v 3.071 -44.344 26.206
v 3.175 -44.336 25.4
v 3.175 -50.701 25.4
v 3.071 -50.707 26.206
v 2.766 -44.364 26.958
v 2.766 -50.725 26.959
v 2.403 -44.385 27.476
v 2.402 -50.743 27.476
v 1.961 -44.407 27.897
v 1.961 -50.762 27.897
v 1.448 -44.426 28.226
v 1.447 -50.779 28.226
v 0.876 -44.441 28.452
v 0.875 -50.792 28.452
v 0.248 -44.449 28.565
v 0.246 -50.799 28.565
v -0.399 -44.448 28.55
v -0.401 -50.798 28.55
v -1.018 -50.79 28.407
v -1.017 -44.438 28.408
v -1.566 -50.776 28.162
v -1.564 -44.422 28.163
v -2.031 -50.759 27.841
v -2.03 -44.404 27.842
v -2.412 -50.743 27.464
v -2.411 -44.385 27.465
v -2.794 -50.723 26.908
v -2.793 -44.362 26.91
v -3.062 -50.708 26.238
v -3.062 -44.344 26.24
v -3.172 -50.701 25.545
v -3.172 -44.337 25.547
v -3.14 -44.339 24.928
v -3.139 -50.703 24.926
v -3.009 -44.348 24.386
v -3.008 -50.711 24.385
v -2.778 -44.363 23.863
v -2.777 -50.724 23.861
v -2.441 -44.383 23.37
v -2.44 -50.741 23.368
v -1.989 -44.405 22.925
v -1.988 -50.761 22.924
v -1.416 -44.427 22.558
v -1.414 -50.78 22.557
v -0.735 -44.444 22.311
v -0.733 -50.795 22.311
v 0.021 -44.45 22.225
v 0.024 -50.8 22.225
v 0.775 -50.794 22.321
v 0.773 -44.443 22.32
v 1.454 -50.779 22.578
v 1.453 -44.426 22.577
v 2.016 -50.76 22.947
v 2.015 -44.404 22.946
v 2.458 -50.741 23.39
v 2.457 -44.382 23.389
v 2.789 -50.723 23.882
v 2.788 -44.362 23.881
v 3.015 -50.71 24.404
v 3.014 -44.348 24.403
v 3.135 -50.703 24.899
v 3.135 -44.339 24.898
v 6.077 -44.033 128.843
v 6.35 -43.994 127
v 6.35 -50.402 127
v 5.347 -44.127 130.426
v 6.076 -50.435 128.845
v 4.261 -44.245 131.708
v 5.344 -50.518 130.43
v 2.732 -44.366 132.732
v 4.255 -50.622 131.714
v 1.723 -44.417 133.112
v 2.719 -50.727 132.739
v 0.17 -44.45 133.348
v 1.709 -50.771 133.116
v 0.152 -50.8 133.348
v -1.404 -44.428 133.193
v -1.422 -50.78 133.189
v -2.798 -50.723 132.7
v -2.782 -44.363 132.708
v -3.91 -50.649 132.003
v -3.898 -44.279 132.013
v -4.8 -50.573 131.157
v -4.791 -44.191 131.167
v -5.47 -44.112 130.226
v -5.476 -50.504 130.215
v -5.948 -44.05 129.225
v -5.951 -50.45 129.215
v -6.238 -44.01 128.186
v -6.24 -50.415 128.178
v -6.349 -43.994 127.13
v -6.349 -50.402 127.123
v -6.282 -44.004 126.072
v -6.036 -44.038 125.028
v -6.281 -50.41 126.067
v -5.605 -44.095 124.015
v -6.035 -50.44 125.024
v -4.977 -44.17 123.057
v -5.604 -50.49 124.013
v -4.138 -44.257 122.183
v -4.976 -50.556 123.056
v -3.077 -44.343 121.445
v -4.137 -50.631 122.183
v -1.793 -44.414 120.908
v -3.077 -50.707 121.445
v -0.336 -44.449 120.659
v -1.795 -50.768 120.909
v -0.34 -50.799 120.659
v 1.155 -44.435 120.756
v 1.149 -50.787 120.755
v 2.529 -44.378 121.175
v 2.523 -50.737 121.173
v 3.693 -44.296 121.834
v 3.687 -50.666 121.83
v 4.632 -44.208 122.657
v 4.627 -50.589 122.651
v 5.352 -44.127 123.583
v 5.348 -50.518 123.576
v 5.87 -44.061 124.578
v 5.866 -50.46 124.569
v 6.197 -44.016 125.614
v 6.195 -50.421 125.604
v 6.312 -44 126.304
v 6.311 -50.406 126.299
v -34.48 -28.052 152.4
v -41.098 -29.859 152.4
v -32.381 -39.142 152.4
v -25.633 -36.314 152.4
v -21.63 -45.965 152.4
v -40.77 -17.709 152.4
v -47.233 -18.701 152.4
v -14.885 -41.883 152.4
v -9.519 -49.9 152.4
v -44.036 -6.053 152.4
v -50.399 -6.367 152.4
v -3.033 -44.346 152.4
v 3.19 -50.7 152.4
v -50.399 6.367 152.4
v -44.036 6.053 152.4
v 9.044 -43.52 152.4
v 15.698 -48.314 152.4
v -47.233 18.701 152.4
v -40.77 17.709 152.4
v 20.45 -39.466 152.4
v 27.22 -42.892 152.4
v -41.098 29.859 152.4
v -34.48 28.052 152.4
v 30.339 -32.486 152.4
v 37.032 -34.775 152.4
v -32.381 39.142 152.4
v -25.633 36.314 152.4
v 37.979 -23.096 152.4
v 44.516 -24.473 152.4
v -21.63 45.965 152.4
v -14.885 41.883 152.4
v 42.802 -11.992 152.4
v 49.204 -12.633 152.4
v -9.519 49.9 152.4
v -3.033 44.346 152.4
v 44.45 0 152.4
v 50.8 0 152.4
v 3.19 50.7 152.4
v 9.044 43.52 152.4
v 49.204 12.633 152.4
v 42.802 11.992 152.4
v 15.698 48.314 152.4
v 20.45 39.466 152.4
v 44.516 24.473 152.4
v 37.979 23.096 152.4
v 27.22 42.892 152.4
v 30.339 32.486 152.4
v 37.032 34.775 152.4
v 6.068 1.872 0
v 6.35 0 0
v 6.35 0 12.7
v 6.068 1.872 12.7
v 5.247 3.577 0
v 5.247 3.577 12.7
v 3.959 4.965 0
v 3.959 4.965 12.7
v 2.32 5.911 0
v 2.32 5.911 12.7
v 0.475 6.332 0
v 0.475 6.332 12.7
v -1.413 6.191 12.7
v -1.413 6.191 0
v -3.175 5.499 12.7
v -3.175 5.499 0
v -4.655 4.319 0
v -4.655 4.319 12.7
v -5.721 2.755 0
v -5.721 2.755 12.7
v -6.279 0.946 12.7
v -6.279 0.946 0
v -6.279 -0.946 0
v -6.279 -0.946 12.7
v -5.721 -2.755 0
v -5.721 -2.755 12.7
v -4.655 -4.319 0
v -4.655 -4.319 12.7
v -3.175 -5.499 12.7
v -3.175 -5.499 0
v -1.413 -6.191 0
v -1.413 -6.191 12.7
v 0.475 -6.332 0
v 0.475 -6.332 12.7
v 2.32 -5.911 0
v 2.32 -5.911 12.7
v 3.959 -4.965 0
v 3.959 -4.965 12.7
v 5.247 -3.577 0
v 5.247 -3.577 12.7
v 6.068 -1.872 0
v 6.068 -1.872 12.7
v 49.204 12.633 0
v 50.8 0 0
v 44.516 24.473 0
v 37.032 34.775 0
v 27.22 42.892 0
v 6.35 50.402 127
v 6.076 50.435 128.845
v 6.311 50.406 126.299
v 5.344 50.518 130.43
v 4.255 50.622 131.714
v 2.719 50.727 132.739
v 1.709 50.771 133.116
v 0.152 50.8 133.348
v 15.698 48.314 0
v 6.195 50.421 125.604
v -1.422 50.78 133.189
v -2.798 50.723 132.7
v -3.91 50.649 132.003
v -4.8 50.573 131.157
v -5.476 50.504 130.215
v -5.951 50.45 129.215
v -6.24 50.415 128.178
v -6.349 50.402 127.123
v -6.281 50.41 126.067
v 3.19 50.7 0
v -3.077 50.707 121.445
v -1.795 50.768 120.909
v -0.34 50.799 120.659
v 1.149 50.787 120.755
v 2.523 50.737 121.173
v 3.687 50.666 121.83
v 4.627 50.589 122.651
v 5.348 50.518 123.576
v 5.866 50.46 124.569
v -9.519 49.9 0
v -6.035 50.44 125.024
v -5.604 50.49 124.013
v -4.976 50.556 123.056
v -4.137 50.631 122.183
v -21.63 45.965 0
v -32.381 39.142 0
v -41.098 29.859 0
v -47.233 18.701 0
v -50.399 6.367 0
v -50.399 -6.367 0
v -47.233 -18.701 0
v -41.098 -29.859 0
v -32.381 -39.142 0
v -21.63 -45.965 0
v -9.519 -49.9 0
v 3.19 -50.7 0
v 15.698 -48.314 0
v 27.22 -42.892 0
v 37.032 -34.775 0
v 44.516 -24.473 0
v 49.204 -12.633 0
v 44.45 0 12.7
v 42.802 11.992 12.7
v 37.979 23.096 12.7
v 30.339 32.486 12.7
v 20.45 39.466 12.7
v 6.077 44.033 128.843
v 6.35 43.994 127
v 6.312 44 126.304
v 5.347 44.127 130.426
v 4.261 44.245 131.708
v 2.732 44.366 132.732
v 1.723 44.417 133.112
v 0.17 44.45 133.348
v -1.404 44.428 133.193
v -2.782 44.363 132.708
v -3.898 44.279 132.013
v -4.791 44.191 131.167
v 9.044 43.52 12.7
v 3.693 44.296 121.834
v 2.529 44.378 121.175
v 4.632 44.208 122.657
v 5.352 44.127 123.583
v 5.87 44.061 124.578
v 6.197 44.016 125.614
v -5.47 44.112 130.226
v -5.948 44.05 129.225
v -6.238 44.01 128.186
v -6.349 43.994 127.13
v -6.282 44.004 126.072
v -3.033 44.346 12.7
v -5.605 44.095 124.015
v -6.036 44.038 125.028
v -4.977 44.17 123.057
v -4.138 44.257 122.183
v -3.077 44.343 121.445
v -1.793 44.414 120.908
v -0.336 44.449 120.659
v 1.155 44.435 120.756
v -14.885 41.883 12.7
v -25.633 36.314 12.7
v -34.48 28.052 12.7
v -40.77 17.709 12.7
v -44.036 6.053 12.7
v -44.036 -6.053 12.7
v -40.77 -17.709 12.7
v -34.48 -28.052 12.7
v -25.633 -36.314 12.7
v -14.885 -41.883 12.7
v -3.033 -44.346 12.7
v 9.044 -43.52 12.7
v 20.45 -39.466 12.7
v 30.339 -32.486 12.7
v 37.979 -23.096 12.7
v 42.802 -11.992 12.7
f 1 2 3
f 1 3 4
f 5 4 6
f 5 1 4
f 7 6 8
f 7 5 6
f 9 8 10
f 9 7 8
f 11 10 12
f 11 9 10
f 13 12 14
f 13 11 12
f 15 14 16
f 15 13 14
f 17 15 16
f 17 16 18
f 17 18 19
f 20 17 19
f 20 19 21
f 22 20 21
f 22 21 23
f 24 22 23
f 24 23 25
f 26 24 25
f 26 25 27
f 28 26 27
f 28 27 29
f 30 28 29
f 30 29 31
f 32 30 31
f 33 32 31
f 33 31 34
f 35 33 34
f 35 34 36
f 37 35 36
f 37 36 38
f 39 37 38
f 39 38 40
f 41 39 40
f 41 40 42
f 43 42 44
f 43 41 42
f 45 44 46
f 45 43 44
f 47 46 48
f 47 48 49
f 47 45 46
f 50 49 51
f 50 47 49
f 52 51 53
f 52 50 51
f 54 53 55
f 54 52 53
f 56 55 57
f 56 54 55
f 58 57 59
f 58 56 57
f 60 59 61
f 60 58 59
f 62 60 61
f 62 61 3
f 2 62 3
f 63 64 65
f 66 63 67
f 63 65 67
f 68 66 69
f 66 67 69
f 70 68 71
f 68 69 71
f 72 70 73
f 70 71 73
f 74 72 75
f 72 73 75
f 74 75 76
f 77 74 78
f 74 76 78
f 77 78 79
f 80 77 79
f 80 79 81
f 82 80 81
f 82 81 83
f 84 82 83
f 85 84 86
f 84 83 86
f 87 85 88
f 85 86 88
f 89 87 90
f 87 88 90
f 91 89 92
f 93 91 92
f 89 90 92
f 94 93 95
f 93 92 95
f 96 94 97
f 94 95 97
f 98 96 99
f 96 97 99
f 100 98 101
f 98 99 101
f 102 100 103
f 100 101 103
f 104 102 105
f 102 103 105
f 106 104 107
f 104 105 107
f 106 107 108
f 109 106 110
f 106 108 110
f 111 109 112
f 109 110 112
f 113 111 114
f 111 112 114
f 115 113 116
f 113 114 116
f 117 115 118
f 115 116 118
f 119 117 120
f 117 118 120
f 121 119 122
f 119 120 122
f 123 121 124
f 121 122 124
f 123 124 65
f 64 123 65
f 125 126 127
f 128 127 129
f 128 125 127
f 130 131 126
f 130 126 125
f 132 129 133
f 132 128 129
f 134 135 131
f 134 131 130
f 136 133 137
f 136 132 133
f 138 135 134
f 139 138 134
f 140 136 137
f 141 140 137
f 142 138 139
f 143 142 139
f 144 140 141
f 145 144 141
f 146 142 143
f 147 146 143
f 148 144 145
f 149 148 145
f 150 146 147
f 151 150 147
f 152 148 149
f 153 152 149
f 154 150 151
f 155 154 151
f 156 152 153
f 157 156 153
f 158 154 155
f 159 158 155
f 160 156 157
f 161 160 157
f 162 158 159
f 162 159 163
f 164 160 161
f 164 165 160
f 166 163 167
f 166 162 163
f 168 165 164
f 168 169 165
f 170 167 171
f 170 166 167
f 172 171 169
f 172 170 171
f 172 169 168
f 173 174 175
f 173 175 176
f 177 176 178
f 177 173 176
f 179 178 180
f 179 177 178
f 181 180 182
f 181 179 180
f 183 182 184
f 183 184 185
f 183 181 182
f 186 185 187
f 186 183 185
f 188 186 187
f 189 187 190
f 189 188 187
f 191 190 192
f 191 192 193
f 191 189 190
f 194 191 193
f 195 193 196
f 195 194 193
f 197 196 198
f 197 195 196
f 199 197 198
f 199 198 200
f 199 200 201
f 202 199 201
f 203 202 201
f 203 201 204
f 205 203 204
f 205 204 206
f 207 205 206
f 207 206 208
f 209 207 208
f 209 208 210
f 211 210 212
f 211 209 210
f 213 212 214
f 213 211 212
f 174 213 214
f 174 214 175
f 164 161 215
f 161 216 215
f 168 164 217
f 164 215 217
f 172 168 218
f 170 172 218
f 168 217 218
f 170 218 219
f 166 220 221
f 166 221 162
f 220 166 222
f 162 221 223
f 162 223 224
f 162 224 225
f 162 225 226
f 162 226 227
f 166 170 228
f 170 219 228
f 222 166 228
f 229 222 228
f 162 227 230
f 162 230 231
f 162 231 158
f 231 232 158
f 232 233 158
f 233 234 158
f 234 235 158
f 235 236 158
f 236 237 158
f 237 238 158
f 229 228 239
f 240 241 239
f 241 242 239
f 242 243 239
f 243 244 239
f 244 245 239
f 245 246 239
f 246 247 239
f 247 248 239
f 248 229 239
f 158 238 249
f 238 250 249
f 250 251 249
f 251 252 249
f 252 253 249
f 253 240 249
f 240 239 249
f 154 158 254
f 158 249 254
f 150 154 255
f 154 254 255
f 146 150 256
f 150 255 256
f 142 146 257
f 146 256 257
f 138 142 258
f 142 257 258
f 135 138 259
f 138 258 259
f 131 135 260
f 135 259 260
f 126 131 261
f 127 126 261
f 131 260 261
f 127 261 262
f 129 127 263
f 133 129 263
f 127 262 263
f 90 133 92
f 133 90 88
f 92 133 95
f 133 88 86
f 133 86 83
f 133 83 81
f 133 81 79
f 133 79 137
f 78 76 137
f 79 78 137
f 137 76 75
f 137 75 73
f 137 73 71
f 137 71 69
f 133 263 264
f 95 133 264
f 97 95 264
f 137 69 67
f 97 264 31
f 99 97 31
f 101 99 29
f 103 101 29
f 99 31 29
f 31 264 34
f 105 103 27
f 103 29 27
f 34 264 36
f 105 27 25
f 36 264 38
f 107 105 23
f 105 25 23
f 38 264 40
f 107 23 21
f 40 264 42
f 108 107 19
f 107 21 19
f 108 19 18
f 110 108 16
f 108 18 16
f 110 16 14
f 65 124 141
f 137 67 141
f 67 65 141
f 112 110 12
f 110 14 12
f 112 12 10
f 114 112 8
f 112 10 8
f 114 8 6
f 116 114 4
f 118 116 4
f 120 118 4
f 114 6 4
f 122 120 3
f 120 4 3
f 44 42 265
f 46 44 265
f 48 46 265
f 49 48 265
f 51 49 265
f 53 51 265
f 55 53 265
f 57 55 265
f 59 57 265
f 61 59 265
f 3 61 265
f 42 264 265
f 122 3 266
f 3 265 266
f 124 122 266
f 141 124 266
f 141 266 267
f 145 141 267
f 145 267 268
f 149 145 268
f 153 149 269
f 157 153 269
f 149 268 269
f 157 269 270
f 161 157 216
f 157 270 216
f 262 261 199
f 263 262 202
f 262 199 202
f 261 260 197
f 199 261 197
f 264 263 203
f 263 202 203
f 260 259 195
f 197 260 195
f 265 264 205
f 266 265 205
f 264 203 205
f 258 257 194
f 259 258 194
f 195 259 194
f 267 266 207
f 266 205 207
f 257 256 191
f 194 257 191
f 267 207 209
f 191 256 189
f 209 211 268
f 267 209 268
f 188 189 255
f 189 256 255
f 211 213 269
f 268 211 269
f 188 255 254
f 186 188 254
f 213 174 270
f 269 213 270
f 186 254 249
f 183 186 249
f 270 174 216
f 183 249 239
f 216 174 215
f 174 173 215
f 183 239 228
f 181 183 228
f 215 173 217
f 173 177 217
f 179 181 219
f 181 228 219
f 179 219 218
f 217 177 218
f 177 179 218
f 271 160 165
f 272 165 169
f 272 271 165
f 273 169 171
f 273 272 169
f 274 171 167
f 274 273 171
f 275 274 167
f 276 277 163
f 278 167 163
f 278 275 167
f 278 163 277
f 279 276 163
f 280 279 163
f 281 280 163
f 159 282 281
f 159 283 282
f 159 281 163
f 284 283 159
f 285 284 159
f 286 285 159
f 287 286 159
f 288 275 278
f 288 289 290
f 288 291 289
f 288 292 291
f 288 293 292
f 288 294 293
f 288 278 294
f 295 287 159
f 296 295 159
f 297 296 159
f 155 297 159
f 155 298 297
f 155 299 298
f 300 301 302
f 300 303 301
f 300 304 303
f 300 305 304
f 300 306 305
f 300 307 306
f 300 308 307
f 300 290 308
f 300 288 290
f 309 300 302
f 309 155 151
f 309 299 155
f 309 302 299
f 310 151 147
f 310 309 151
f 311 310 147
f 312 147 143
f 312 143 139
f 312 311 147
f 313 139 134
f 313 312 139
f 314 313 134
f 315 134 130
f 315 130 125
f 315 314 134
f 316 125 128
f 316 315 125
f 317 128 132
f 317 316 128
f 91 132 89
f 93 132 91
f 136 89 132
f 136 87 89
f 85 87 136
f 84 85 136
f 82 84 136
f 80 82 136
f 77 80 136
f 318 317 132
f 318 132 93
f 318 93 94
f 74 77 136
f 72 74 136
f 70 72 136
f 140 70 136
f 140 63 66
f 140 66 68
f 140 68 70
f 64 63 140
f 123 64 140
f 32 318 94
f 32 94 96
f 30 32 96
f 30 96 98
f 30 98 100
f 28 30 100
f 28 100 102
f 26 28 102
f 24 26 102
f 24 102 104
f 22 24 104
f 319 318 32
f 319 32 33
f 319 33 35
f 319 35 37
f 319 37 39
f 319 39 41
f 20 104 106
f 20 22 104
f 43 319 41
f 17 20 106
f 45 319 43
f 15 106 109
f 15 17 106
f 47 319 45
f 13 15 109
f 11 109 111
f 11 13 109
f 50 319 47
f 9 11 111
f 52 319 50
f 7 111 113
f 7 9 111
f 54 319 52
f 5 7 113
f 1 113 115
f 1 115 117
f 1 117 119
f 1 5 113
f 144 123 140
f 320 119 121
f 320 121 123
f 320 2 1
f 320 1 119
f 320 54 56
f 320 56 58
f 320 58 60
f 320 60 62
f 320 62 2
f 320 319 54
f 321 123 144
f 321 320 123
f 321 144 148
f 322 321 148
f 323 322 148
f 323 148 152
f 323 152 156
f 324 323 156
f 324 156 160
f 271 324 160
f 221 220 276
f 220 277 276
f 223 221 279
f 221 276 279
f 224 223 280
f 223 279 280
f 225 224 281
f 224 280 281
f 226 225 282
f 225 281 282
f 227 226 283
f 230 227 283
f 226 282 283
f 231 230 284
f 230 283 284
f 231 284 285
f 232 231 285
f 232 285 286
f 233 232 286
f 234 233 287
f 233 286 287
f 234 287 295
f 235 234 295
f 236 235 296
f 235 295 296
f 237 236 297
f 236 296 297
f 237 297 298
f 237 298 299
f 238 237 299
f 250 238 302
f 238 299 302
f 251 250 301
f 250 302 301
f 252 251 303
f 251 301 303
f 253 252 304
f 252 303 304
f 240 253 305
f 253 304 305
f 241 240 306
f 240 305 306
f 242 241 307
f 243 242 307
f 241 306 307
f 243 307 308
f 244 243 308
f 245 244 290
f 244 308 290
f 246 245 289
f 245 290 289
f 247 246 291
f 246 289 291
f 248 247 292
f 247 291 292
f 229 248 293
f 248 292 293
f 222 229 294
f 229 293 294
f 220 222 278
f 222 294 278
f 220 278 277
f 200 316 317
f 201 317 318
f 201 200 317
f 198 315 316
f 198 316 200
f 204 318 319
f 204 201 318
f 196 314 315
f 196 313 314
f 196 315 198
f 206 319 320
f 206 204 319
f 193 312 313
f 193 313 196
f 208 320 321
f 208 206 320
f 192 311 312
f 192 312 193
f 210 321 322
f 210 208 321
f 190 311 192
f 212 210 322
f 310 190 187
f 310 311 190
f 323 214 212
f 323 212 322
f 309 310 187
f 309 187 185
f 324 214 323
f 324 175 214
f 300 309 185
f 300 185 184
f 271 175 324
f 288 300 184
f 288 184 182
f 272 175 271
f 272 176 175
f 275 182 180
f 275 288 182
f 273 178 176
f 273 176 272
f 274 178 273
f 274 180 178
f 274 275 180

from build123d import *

# Parameters (mm, degrees)
F0_R     = 50.8
F0_R_2   = 44.45
F1_DEPTH = 152.4
F0_R_3   = 6.35
F2_DEPTH = 12.7
F3_R     = 6.35
F4_DEPTH = 63.5
F3_R_2   = 3.175
F5_DEPTH = 50.8010001


with BuildPart() as f1:
    # F0 (on Top) → F1 (new body)
    with BuildSketch(Plane.XY):
        Circle(F0_R)
        Circle(F0_R_2, mode=Mode.SUBTRACT)
    extrude(amount=F1_DEPTH)

    # F0 (on Top) → F2 (join)
    with BuildSketch(Plane.XY):
        Circle(F0_R)
        Circle(F0_R_2, mode=Mode.SUBTRACT)
        Circle(F0_R_2)
        Circle(F0_R_3, mode=Mode.SUBTRACT)
    extrude(amount=F2_DEPTH)

    # F3 (on Front) → F4 (cut, symmetric)
    with BuildSketch(Plane.XZ):
        with Locations((0, 127)):
            Circle(F3_R)
    extrude(amount=F4_DEPTH, both=True, mode=Mode.SUBTRACT)

    # F3 (on Front) → F5 (cut, through all)
    with BuildSketch(Plane.XZ):
        with Locations((0, 25.4)):
            Circle(F3_R_2)
    extrude(amount=F5_DEPTH, mode=Mode.SUBTRACT)


solid = f1.part
